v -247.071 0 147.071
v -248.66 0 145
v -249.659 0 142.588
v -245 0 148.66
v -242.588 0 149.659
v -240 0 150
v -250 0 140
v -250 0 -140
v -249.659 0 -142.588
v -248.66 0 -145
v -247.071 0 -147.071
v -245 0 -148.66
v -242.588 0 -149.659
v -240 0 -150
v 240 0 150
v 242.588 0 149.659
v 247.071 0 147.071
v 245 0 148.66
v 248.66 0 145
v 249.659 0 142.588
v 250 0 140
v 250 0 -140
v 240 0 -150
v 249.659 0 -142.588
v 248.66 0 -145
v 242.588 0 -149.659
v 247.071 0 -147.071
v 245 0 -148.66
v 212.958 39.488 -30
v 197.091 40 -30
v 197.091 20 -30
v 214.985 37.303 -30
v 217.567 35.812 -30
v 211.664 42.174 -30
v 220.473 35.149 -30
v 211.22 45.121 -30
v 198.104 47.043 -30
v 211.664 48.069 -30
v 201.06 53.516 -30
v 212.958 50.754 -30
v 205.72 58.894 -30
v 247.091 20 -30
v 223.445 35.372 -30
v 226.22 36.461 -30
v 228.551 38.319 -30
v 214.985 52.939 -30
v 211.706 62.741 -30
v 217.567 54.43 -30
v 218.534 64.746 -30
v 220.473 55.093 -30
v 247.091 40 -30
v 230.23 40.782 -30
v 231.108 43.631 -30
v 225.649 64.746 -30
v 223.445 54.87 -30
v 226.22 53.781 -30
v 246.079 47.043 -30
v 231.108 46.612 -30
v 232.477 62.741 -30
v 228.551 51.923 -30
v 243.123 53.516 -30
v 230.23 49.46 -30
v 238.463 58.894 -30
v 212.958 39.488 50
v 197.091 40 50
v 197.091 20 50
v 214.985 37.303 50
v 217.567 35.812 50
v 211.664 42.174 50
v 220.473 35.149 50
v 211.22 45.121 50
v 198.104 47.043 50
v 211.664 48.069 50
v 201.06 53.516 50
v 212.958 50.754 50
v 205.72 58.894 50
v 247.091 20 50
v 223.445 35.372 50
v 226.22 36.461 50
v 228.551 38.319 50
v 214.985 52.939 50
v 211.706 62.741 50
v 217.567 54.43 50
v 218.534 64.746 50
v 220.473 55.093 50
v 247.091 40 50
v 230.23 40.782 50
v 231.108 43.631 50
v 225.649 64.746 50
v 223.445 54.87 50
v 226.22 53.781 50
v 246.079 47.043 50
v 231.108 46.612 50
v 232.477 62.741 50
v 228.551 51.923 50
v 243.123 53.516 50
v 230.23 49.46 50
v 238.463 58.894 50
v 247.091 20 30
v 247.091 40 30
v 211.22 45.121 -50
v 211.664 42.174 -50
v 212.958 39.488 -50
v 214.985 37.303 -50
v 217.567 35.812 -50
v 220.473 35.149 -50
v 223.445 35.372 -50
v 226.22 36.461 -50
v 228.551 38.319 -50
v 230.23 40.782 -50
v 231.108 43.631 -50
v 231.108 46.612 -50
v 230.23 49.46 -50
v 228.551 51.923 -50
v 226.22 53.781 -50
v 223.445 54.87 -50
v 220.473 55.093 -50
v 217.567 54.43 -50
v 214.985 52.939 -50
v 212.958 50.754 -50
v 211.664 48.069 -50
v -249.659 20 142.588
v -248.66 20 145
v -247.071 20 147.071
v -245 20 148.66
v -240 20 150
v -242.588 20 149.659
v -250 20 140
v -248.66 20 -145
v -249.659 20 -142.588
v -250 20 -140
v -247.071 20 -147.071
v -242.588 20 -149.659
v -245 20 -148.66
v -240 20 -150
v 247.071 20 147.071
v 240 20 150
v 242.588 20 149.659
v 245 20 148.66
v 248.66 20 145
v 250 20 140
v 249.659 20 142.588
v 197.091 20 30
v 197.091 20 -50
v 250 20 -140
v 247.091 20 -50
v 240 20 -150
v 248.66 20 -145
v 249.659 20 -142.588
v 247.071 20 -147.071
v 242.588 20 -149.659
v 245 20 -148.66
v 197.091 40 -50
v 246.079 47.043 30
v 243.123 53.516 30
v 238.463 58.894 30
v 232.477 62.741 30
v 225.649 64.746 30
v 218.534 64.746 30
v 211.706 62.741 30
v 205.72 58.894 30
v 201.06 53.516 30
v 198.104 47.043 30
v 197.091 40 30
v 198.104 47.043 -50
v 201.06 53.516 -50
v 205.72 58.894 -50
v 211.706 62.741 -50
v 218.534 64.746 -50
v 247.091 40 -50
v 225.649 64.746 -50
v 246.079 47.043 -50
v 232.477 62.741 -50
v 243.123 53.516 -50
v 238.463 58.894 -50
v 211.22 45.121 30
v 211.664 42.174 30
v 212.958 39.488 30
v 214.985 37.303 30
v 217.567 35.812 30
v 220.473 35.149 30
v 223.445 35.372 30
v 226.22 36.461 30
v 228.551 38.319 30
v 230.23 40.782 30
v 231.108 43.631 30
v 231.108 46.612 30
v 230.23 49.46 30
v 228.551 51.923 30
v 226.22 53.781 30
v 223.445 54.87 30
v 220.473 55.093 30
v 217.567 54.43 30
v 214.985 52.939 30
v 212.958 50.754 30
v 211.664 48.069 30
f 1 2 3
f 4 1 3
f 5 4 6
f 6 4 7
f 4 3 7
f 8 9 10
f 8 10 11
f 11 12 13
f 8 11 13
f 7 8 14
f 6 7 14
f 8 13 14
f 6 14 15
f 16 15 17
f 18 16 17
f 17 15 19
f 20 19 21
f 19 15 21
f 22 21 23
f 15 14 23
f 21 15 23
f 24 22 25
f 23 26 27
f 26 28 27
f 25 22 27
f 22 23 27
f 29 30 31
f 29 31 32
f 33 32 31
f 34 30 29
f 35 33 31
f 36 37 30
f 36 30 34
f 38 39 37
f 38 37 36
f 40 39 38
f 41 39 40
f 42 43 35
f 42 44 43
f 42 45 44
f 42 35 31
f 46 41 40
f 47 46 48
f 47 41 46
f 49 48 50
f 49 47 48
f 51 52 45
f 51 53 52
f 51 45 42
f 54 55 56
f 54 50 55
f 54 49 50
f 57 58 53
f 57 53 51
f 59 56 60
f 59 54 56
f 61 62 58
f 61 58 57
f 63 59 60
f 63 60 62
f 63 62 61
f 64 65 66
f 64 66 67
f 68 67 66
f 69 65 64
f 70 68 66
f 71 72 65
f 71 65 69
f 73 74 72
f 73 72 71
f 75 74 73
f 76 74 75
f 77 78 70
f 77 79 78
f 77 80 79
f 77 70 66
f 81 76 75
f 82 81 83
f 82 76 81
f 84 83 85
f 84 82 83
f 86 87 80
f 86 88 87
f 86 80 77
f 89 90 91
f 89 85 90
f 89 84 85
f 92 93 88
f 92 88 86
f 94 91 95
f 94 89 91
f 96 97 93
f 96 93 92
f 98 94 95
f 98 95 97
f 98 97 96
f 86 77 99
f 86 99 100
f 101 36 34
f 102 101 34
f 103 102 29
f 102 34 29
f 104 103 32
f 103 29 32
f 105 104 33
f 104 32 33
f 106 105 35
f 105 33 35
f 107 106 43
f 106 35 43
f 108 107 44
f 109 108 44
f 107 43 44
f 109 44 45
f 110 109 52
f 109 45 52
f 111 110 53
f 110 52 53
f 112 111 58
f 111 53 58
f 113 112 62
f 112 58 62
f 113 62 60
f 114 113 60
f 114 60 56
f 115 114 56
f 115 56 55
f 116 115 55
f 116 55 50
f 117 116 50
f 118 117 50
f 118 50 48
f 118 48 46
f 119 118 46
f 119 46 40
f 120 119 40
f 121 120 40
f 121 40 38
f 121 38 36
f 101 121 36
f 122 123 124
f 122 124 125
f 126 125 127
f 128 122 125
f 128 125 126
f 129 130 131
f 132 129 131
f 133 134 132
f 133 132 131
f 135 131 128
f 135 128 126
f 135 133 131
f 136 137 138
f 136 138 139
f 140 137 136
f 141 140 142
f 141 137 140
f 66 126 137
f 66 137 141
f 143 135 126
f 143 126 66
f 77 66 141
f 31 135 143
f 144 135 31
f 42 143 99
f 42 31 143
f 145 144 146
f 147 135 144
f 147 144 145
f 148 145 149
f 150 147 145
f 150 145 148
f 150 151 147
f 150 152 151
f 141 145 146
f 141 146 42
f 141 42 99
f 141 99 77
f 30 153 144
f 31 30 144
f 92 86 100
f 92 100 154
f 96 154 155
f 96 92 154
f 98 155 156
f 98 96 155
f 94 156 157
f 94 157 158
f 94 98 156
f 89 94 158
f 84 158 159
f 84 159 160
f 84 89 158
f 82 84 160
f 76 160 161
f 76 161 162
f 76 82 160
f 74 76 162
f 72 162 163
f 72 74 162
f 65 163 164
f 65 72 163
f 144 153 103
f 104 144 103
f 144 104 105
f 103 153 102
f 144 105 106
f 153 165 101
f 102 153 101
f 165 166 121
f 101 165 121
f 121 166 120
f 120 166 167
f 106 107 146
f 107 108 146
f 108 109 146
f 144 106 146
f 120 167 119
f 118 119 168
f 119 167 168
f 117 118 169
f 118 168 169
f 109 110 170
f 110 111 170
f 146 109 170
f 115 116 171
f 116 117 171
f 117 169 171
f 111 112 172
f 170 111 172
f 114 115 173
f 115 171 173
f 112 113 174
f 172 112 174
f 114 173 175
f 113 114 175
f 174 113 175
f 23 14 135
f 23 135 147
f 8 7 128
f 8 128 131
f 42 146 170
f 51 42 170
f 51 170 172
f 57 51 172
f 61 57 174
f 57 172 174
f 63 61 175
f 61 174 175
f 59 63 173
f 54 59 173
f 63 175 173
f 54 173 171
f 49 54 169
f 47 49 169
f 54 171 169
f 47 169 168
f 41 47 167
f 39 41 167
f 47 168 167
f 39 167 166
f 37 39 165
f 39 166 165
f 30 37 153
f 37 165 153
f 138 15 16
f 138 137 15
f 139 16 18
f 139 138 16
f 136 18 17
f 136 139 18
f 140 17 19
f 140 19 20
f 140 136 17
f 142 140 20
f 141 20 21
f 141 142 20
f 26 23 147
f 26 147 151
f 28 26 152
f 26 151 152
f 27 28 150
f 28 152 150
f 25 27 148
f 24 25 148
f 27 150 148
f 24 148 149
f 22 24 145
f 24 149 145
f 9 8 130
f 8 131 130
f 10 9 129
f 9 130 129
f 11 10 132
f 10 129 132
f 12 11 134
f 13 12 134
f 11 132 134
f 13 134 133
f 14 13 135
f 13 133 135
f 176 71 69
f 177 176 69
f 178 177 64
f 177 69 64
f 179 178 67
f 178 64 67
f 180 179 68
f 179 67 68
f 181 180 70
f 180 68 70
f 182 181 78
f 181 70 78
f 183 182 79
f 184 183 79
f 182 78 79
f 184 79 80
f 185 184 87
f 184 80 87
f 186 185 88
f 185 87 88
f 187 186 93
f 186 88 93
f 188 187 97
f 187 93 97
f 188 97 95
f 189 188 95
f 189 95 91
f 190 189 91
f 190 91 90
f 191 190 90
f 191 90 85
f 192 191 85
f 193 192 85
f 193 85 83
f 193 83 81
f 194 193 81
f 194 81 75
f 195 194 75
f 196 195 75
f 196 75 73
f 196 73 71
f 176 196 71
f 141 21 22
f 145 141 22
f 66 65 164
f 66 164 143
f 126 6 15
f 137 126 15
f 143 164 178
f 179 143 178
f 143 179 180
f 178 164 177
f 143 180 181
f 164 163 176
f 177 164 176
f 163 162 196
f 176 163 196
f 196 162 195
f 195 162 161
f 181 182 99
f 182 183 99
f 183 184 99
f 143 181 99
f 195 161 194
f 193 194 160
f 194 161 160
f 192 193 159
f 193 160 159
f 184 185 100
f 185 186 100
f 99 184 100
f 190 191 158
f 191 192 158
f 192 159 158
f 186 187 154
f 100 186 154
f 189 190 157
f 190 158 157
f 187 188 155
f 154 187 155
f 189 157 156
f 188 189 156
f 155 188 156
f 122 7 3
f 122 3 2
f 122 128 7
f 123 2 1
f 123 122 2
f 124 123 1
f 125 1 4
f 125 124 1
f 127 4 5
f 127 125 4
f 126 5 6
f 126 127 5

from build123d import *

# Parameters (mm, degrees)
SKETCH1_W           = 500
SKETCH1_H           = 300
BOSS_EXTRUDE1_DEPTH = 20
BOSS_EXTRUDE2_START = -100
BOSS_EXTRUDE2_DEPTH = 20
SKETCH3_R           = 10
CUT_EXTRUDE1_DEPTH  = 286
FILLET1_R           = 10


with BuildPart() as part:
    # Sketch1 → Boss-Extrude1 (new body)
    with BuildSketch(Plane(origin=(0, 0, 0), x_dir=(1, 0, 0), z_dir=(0, 1, 0))):
        Rectangle(SKETCH1_W, SKETCH1_H)
    extrude(amount=BOSS_EXTRUDE1_DEPTH)

    # Sketch2 → Boss-Extrude2 (add)
    with BuildSketch(Plane.XY.offset(150).offset(BOSS_EXTRUDE2_START)):
        with BuildLine():
            Line((197.091467049, 40), (197.091467049, 0))
            Line((197.091467049, 0), (247.091467049, 0))
            Line((247.091467049, 0), (247.091467049, 40))
            ThreePointArc((247.091467049, 40), (222.091467049, 65), (197.091467049, 40))
        make_face()
    boss_extrude2 = extrude(amount=-BOSS_EXTRUDE2_DEPTH)

    # Mirror1: Boss-Extrude2 across plane
    add(boss_extrude2.mirror(Plane.XY))

    # Sketch3 → Cut-Extrude1 (cut)
    with BuildSketch(Plane.XY.offset(50)):
        with Locations(Location((221.220080181, 45.121109354, 0), (0, 0, 180))):
            Circle(SKETCH3_R)
    extrude(amount=-CUT_EXTRUDE1_DEPTH, mode=Mode.SUBTRACT)

    # Fillet1
    fillet1_edges = [part.edges().sort_by_distance(p)[0] for p in [
        (250, 10, 150),
        (-250, 10, 150),
        (-250, 10, -150),
        (250, 10, -150),
    ]]
    fillet(fillet1_edges, radius=FILLET1_R)


solid = part.part
